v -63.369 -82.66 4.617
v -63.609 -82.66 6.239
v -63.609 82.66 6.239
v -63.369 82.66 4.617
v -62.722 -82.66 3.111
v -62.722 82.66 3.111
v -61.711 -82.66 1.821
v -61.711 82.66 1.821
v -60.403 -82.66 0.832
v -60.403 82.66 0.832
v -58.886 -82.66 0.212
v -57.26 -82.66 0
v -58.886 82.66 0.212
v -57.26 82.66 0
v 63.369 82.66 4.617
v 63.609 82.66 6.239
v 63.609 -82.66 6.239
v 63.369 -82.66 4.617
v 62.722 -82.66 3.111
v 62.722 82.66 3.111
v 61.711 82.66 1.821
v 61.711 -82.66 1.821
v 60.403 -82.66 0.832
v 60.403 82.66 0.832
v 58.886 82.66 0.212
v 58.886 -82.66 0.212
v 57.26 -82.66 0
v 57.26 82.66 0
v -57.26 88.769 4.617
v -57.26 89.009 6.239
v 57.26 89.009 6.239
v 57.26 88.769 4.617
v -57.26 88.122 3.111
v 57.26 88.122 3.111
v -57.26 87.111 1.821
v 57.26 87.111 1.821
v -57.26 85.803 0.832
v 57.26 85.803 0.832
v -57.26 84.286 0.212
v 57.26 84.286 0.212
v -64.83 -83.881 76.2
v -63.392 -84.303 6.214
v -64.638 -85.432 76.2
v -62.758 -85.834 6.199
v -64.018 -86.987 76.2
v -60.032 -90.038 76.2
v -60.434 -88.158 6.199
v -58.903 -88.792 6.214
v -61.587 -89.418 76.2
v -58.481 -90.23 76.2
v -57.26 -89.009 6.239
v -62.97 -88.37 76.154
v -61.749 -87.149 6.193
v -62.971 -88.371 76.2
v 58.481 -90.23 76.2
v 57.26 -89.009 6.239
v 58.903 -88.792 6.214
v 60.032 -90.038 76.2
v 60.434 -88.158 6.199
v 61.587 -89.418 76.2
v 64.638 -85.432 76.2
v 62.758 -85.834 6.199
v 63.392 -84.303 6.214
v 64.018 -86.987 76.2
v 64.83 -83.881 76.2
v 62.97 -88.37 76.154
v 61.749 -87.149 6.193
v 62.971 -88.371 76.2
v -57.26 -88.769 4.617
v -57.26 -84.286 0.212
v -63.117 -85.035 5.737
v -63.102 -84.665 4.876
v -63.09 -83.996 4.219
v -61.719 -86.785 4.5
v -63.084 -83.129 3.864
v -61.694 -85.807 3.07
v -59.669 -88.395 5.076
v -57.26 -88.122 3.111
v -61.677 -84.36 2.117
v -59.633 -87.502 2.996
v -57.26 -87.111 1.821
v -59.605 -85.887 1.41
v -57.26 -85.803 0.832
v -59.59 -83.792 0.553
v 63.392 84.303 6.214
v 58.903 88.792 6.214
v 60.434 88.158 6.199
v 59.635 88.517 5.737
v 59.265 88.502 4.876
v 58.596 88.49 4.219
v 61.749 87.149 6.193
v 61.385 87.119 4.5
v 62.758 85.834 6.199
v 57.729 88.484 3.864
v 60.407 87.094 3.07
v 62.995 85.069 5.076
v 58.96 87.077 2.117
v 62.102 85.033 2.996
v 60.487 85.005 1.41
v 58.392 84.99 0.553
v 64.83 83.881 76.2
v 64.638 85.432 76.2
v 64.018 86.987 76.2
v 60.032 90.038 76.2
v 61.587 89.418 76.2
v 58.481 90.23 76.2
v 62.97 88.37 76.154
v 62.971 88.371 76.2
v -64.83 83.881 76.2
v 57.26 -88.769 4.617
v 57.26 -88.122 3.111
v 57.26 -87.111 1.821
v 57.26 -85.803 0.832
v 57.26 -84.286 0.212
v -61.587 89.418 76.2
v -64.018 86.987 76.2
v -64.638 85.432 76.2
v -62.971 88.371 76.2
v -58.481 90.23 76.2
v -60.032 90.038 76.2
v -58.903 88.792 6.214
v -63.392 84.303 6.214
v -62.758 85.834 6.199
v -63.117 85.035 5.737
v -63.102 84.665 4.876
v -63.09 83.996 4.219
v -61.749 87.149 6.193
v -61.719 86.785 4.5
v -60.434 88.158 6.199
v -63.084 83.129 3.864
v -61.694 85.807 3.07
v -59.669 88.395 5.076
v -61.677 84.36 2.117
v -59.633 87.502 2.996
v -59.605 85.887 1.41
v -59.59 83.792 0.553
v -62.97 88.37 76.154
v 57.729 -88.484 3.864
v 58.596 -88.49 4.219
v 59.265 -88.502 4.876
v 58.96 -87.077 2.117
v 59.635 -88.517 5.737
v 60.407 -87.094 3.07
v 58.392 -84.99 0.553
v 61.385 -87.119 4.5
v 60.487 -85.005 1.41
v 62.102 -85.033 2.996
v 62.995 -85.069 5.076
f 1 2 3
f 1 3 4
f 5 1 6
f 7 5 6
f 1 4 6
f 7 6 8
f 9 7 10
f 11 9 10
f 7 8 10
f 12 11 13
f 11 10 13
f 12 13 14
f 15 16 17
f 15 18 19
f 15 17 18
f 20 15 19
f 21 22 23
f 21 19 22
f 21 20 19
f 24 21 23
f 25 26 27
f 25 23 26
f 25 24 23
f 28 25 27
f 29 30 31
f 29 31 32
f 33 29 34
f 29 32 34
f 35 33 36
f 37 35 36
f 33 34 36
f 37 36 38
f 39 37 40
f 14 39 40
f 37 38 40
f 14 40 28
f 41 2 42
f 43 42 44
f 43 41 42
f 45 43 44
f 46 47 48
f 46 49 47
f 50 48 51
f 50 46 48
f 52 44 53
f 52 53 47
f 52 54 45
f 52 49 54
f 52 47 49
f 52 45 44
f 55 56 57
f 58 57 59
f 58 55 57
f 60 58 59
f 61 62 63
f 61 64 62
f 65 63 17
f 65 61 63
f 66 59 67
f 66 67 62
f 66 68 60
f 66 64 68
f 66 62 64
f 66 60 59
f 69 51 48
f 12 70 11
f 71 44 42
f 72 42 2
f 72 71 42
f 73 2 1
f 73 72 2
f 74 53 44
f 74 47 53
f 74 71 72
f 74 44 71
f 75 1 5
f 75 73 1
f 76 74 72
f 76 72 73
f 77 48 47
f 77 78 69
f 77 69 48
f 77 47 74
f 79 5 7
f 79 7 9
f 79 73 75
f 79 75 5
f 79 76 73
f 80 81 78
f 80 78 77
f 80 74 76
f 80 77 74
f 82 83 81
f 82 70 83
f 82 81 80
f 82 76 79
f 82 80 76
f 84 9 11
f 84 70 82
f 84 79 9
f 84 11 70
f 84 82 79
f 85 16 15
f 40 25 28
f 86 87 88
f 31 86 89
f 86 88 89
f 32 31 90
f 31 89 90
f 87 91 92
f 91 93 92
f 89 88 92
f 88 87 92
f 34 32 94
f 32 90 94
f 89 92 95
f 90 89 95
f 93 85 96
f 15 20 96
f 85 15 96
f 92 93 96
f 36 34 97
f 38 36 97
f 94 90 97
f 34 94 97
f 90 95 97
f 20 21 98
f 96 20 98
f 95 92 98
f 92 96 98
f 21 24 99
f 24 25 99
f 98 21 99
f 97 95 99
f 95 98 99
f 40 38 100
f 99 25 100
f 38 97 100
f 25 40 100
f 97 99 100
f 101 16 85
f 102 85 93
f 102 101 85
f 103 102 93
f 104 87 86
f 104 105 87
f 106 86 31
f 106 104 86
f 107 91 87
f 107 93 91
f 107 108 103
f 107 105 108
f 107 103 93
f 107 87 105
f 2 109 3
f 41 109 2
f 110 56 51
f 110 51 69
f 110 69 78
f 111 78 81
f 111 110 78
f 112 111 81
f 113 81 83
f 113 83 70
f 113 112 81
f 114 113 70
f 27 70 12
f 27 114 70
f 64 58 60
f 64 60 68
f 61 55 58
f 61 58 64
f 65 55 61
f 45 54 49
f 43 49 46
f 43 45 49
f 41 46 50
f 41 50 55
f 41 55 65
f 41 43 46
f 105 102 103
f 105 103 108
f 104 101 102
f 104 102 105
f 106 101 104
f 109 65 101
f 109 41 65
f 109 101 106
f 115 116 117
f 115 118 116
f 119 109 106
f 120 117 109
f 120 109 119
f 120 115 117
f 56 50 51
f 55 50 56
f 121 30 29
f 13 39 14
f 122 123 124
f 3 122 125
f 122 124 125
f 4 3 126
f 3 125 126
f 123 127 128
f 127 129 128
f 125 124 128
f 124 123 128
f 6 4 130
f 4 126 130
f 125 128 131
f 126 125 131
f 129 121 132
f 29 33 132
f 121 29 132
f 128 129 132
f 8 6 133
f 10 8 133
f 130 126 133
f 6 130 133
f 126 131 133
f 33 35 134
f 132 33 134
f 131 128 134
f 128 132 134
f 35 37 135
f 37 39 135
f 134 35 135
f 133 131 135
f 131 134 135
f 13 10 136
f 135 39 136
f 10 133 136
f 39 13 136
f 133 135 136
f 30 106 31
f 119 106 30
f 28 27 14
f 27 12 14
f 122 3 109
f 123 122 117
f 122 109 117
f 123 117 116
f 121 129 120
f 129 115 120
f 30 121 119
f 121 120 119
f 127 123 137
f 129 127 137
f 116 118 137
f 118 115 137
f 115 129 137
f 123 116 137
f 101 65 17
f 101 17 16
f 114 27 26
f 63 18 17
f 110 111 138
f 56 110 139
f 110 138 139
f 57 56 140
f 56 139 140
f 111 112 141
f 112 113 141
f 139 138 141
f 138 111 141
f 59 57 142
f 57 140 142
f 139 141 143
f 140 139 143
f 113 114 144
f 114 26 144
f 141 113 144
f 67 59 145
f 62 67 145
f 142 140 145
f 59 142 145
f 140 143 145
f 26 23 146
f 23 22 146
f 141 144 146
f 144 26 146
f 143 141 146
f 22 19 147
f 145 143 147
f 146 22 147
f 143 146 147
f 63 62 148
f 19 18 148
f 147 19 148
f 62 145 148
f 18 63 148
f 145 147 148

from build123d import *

# Parameters (mm, degrees)
F0_W     = 127
F0_H     = 177.8
F1_DEPTH = 76.2
F1_TAPER = -1
F3_R     = 6.35


# Not quite as in the source:
# - a feature of the source that left no trace in its solid (it failed there, or was rolled back) is left out


with BuildPart() as f1:
    # F0 (on Top) → F1 (new body)
    with BuildSketch(Plane.XY):
        Rectangle(F0_W, F0_H)
    extrude(amount=F1_DEPTH, taper=F1_TAPER)

    # F3
    f3_edges = [f1.edges().sort_by_distance(p)[0] for p in [
        (63.5, 0, 0),
        (0, -88.9, 0),
        (64.165038, -89.565038, 38.1),
        (-64.165038, -89.565038, 38.1),
        (64.165038, 89.565038, 38.1),
        (0, 88.9, 0),
        (-64.165038, 89.565038, 38.1),
        (-63.5, 0, 0),
    ]]
    fillet(f3_edges, radius=F3_R)


solid = f1.part
